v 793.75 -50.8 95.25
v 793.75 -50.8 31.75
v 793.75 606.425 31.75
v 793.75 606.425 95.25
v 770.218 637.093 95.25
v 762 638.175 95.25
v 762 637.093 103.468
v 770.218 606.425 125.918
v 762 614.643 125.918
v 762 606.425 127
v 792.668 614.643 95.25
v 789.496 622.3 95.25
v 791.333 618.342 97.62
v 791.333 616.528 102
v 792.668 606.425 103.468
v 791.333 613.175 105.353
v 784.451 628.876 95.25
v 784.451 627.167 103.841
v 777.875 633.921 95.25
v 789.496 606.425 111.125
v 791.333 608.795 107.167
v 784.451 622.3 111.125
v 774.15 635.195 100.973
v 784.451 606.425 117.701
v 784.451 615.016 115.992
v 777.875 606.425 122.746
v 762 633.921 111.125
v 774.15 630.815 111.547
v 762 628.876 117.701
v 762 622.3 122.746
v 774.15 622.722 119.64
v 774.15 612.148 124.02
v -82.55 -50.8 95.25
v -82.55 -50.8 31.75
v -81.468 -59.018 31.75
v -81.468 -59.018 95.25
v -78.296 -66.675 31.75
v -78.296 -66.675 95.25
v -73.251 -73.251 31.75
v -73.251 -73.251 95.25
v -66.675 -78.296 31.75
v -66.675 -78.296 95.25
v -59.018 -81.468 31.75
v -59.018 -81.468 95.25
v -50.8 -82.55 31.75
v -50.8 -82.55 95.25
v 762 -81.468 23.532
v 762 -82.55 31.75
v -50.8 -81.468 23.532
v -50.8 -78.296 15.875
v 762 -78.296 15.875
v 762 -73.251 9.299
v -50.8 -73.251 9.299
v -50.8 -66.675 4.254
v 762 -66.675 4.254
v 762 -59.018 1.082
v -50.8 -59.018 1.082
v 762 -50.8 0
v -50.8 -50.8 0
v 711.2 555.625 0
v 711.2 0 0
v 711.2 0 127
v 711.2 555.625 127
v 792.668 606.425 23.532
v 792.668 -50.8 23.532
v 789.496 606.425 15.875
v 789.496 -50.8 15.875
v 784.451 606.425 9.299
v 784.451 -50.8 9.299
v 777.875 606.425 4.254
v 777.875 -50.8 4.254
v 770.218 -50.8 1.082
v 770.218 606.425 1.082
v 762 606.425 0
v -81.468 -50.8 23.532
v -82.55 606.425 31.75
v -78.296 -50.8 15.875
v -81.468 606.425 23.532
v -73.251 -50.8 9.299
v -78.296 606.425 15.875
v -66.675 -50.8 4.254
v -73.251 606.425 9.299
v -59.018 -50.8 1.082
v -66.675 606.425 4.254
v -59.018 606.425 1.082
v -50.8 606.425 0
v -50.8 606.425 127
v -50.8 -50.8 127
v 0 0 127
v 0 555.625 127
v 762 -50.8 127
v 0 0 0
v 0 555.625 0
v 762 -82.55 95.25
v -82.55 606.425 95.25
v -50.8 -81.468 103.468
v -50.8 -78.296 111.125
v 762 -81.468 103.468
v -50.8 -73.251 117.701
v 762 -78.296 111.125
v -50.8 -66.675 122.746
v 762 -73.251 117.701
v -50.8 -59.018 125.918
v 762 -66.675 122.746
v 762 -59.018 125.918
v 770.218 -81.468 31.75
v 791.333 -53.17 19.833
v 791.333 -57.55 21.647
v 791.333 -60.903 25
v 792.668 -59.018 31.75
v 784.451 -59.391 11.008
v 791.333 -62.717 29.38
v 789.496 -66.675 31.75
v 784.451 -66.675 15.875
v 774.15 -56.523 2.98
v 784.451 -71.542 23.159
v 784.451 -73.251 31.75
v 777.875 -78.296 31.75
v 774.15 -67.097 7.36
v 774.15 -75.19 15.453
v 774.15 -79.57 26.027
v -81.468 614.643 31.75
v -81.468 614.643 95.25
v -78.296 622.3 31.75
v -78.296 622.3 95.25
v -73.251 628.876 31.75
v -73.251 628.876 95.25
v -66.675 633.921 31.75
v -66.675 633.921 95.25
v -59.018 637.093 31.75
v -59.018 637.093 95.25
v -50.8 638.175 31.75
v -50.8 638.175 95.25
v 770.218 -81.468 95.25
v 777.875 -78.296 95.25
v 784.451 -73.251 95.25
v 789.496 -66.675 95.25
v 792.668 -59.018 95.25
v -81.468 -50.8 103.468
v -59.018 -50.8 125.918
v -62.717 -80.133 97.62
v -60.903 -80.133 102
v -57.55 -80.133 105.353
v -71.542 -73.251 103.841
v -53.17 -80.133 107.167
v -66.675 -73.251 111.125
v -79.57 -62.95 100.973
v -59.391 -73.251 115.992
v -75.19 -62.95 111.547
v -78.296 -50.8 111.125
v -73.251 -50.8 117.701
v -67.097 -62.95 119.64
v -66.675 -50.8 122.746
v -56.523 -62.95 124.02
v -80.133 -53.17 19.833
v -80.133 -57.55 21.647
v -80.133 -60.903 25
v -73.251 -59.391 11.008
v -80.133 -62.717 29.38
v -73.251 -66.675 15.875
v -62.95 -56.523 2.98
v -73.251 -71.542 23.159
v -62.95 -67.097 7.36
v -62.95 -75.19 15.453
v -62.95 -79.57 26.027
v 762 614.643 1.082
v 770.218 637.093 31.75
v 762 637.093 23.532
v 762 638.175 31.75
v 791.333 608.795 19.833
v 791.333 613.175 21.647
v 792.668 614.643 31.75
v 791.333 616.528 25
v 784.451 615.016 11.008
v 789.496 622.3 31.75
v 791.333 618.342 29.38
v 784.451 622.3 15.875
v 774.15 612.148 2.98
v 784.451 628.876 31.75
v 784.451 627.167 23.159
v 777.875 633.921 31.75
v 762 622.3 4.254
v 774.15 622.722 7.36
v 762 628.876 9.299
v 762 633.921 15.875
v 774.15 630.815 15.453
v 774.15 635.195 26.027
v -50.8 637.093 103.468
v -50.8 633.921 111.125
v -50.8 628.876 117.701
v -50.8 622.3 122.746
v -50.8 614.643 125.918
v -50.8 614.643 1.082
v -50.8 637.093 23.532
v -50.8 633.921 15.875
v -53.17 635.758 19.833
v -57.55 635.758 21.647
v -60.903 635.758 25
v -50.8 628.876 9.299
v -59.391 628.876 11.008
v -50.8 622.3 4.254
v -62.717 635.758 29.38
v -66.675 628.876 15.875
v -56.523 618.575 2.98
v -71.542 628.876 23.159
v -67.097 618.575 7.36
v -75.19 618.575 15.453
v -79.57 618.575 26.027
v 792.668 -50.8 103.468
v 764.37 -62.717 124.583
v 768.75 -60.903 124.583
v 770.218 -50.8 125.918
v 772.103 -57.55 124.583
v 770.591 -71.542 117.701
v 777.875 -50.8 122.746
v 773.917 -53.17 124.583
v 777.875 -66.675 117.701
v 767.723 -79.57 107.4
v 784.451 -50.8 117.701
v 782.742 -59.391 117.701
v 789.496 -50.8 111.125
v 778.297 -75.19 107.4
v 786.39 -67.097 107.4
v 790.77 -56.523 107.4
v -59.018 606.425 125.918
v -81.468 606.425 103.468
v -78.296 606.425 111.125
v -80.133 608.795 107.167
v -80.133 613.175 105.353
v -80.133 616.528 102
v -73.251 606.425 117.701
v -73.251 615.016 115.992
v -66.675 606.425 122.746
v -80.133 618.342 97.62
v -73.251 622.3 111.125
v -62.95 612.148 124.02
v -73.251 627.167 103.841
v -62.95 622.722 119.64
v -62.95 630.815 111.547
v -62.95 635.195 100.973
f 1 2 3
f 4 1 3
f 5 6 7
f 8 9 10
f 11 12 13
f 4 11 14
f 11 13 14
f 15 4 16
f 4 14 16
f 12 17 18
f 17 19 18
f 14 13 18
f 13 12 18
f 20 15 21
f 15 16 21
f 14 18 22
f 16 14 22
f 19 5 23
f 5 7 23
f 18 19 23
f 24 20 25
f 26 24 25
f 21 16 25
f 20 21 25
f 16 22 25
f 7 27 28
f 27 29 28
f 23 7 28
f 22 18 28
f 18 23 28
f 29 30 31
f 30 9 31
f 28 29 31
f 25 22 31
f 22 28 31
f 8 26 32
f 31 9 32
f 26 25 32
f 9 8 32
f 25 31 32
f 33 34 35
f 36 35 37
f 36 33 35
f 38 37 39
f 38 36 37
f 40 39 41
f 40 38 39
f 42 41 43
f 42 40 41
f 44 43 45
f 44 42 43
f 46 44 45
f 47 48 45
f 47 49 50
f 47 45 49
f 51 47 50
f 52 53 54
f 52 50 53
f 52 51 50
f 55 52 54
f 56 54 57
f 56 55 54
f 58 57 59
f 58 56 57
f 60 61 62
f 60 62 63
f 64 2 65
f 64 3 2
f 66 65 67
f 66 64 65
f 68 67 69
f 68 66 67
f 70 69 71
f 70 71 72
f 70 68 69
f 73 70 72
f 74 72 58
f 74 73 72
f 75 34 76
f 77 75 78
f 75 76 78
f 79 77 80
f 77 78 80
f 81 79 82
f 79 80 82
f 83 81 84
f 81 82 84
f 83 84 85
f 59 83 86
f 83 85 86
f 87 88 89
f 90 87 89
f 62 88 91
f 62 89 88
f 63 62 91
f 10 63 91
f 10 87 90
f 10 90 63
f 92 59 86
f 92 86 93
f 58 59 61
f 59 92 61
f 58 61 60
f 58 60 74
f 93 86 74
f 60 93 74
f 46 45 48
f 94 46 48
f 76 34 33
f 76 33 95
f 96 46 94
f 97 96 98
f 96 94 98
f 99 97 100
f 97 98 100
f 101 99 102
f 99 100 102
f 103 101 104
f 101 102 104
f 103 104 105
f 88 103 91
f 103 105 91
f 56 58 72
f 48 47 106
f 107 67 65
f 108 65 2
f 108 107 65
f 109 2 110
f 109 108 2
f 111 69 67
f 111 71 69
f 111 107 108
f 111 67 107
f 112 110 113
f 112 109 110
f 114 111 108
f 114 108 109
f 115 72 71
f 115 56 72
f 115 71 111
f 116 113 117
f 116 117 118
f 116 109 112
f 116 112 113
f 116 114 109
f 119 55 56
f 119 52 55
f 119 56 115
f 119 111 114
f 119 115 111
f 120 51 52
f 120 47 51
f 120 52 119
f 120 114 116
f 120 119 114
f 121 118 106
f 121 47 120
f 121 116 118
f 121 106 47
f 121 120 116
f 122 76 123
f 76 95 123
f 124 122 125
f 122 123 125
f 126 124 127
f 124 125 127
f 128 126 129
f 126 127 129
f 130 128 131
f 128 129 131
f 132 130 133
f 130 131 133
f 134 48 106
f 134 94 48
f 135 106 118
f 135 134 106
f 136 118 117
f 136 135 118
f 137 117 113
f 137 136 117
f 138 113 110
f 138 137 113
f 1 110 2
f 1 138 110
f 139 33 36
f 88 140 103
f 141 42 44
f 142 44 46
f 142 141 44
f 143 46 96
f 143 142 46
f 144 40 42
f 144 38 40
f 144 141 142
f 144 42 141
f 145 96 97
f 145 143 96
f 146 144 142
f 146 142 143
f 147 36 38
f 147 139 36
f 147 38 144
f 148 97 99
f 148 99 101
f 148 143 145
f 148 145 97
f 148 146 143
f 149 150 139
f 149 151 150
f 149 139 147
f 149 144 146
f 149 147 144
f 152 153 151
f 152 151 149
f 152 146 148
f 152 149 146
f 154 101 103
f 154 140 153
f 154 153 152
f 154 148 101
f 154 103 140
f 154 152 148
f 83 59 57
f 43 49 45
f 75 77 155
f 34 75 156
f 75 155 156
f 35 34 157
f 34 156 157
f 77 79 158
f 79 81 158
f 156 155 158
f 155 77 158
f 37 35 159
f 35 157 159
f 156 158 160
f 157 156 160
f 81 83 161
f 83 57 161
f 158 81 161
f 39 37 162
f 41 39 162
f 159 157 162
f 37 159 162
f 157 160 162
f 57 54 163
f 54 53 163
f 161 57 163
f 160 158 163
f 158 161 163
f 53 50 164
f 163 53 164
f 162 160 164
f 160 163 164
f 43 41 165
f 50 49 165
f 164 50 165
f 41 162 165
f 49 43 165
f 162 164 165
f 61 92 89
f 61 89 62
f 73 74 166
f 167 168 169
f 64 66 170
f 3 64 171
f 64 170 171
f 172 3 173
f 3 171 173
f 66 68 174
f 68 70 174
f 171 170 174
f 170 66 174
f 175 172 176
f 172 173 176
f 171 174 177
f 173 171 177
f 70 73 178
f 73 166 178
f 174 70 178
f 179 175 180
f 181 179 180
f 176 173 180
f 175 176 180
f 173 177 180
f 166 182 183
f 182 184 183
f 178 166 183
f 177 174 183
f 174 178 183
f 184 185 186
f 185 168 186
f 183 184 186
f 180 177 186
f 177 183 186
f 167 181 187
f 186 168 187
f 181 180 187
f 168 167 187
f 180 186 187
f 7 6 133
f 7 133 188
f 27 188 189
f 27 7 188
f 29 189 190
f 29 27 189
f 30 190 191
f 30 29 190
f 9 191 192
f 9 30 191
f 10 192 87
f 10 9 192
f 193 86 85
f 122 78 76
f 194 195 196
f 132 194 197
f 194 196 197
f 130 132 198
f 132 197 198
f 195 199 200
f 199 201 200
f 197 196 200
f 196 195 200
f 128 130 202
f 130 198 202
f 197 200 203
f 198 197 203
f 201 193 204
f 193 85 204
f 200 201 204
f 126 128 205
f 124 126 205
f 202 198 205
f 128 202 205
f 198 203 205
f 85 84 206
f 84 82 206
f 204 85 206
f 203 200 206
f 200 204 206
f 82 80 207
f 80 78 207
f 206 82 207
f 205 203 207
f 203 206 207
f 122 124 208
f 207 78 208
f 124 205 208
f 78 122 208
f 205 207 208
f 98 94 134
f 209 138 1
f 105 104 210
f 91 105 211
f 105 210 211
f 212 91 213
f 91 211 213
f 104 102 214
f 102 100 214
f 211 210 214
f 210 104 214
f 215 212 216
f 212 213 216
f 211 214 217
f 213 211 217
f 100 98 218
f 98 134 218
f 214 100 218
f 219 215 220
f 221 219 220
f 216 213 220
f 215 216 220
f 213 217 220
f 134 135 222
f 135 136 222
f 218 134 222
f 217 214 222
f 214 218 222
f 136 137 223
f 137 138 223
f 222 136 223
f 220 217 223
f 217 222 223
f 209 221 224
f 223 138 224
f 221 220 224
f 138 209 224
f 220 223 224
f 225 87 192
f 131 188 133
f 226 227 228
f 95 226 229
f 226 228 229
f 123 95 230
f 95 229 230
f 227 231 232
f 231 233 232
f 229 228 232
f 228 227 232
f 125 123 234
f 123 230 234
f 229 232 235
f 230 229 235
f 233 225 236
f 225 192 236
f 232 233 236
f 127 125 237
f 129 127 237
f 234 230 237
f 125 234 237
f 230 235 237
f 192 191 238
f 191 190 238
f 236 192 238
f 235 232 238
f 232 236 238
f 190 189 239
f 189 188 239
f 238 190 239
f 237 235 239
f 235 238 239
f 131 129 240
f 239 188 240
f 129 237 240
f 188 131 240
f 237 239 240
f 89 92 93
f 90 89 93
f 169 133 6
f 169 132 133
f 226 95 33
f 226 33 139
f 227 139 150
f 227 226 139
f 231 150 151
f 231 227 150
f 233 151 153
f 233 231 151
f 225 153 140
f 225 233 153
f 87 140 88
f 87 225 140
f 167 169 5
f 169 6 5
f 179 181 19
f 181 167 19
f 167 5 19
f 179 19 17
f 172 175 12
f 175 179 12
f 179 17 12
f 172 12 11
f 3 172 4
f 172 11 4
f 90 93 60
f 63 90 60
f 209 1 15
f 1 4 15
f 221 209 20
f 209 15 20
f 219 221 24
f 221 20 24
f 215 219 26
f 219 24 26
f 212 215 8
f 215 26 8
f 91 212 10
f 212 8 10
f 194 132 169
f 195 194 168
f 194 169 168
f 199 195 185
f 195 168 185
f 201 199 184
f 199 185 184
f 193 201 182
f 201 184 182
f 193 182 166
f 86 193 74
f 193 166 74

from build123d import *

# Parameters (mm, degrees)
SKETCH1_W           = 876.3
SKETCH1_H           = 720.725
SKETCH1_W_2         = 711.2
SKETCH1_H_2         = 555.625
BOSS_EXTRUDE1_DEPTH = 127
FILLET1_R           = 31.75


with BuildPart() as part:
    # Sketch1 → Boss-Extrude1 (new body)
    with BuildSketch(Plane.XY):
        with Locations((355.6, 277.8125)):
            Rectangle(SKETCH1_W, SKETCH1_H)
        with Locations((355.6, 277.8125)):
            Rectangle(SKETCH1_W_2, SKETCH1_H_2, mode=Mode.SUBTRACT)
    extrude(amount=BOSS_EXTRUDE1_DEPTH)

    # Fillet1
    fillet1_edges = [part.edges().sort_by_distance(p)[0] for p in [
        (355.6, 638.175, 127),
        (355.6, -82.55, 0),
        (-82.55, 277.8125, 0),
        (355.6, 638.175, 0),
        (793.75, 277.8125, 0),
        (-82.55, 277.8125, 127),
        (793.75, -82.55, 63.5),
        (-82.55, -82.55, 63.5),
        (-82.55, 638.175, 63.5),
        (793.75, 638.175, 63.5),
        (355.6, -82.55, 127),
        (793.75, 277.8125, 127),
    ]]
    fillet(fillet1_edges, radius=FILLET1_R)


solid = part.part
